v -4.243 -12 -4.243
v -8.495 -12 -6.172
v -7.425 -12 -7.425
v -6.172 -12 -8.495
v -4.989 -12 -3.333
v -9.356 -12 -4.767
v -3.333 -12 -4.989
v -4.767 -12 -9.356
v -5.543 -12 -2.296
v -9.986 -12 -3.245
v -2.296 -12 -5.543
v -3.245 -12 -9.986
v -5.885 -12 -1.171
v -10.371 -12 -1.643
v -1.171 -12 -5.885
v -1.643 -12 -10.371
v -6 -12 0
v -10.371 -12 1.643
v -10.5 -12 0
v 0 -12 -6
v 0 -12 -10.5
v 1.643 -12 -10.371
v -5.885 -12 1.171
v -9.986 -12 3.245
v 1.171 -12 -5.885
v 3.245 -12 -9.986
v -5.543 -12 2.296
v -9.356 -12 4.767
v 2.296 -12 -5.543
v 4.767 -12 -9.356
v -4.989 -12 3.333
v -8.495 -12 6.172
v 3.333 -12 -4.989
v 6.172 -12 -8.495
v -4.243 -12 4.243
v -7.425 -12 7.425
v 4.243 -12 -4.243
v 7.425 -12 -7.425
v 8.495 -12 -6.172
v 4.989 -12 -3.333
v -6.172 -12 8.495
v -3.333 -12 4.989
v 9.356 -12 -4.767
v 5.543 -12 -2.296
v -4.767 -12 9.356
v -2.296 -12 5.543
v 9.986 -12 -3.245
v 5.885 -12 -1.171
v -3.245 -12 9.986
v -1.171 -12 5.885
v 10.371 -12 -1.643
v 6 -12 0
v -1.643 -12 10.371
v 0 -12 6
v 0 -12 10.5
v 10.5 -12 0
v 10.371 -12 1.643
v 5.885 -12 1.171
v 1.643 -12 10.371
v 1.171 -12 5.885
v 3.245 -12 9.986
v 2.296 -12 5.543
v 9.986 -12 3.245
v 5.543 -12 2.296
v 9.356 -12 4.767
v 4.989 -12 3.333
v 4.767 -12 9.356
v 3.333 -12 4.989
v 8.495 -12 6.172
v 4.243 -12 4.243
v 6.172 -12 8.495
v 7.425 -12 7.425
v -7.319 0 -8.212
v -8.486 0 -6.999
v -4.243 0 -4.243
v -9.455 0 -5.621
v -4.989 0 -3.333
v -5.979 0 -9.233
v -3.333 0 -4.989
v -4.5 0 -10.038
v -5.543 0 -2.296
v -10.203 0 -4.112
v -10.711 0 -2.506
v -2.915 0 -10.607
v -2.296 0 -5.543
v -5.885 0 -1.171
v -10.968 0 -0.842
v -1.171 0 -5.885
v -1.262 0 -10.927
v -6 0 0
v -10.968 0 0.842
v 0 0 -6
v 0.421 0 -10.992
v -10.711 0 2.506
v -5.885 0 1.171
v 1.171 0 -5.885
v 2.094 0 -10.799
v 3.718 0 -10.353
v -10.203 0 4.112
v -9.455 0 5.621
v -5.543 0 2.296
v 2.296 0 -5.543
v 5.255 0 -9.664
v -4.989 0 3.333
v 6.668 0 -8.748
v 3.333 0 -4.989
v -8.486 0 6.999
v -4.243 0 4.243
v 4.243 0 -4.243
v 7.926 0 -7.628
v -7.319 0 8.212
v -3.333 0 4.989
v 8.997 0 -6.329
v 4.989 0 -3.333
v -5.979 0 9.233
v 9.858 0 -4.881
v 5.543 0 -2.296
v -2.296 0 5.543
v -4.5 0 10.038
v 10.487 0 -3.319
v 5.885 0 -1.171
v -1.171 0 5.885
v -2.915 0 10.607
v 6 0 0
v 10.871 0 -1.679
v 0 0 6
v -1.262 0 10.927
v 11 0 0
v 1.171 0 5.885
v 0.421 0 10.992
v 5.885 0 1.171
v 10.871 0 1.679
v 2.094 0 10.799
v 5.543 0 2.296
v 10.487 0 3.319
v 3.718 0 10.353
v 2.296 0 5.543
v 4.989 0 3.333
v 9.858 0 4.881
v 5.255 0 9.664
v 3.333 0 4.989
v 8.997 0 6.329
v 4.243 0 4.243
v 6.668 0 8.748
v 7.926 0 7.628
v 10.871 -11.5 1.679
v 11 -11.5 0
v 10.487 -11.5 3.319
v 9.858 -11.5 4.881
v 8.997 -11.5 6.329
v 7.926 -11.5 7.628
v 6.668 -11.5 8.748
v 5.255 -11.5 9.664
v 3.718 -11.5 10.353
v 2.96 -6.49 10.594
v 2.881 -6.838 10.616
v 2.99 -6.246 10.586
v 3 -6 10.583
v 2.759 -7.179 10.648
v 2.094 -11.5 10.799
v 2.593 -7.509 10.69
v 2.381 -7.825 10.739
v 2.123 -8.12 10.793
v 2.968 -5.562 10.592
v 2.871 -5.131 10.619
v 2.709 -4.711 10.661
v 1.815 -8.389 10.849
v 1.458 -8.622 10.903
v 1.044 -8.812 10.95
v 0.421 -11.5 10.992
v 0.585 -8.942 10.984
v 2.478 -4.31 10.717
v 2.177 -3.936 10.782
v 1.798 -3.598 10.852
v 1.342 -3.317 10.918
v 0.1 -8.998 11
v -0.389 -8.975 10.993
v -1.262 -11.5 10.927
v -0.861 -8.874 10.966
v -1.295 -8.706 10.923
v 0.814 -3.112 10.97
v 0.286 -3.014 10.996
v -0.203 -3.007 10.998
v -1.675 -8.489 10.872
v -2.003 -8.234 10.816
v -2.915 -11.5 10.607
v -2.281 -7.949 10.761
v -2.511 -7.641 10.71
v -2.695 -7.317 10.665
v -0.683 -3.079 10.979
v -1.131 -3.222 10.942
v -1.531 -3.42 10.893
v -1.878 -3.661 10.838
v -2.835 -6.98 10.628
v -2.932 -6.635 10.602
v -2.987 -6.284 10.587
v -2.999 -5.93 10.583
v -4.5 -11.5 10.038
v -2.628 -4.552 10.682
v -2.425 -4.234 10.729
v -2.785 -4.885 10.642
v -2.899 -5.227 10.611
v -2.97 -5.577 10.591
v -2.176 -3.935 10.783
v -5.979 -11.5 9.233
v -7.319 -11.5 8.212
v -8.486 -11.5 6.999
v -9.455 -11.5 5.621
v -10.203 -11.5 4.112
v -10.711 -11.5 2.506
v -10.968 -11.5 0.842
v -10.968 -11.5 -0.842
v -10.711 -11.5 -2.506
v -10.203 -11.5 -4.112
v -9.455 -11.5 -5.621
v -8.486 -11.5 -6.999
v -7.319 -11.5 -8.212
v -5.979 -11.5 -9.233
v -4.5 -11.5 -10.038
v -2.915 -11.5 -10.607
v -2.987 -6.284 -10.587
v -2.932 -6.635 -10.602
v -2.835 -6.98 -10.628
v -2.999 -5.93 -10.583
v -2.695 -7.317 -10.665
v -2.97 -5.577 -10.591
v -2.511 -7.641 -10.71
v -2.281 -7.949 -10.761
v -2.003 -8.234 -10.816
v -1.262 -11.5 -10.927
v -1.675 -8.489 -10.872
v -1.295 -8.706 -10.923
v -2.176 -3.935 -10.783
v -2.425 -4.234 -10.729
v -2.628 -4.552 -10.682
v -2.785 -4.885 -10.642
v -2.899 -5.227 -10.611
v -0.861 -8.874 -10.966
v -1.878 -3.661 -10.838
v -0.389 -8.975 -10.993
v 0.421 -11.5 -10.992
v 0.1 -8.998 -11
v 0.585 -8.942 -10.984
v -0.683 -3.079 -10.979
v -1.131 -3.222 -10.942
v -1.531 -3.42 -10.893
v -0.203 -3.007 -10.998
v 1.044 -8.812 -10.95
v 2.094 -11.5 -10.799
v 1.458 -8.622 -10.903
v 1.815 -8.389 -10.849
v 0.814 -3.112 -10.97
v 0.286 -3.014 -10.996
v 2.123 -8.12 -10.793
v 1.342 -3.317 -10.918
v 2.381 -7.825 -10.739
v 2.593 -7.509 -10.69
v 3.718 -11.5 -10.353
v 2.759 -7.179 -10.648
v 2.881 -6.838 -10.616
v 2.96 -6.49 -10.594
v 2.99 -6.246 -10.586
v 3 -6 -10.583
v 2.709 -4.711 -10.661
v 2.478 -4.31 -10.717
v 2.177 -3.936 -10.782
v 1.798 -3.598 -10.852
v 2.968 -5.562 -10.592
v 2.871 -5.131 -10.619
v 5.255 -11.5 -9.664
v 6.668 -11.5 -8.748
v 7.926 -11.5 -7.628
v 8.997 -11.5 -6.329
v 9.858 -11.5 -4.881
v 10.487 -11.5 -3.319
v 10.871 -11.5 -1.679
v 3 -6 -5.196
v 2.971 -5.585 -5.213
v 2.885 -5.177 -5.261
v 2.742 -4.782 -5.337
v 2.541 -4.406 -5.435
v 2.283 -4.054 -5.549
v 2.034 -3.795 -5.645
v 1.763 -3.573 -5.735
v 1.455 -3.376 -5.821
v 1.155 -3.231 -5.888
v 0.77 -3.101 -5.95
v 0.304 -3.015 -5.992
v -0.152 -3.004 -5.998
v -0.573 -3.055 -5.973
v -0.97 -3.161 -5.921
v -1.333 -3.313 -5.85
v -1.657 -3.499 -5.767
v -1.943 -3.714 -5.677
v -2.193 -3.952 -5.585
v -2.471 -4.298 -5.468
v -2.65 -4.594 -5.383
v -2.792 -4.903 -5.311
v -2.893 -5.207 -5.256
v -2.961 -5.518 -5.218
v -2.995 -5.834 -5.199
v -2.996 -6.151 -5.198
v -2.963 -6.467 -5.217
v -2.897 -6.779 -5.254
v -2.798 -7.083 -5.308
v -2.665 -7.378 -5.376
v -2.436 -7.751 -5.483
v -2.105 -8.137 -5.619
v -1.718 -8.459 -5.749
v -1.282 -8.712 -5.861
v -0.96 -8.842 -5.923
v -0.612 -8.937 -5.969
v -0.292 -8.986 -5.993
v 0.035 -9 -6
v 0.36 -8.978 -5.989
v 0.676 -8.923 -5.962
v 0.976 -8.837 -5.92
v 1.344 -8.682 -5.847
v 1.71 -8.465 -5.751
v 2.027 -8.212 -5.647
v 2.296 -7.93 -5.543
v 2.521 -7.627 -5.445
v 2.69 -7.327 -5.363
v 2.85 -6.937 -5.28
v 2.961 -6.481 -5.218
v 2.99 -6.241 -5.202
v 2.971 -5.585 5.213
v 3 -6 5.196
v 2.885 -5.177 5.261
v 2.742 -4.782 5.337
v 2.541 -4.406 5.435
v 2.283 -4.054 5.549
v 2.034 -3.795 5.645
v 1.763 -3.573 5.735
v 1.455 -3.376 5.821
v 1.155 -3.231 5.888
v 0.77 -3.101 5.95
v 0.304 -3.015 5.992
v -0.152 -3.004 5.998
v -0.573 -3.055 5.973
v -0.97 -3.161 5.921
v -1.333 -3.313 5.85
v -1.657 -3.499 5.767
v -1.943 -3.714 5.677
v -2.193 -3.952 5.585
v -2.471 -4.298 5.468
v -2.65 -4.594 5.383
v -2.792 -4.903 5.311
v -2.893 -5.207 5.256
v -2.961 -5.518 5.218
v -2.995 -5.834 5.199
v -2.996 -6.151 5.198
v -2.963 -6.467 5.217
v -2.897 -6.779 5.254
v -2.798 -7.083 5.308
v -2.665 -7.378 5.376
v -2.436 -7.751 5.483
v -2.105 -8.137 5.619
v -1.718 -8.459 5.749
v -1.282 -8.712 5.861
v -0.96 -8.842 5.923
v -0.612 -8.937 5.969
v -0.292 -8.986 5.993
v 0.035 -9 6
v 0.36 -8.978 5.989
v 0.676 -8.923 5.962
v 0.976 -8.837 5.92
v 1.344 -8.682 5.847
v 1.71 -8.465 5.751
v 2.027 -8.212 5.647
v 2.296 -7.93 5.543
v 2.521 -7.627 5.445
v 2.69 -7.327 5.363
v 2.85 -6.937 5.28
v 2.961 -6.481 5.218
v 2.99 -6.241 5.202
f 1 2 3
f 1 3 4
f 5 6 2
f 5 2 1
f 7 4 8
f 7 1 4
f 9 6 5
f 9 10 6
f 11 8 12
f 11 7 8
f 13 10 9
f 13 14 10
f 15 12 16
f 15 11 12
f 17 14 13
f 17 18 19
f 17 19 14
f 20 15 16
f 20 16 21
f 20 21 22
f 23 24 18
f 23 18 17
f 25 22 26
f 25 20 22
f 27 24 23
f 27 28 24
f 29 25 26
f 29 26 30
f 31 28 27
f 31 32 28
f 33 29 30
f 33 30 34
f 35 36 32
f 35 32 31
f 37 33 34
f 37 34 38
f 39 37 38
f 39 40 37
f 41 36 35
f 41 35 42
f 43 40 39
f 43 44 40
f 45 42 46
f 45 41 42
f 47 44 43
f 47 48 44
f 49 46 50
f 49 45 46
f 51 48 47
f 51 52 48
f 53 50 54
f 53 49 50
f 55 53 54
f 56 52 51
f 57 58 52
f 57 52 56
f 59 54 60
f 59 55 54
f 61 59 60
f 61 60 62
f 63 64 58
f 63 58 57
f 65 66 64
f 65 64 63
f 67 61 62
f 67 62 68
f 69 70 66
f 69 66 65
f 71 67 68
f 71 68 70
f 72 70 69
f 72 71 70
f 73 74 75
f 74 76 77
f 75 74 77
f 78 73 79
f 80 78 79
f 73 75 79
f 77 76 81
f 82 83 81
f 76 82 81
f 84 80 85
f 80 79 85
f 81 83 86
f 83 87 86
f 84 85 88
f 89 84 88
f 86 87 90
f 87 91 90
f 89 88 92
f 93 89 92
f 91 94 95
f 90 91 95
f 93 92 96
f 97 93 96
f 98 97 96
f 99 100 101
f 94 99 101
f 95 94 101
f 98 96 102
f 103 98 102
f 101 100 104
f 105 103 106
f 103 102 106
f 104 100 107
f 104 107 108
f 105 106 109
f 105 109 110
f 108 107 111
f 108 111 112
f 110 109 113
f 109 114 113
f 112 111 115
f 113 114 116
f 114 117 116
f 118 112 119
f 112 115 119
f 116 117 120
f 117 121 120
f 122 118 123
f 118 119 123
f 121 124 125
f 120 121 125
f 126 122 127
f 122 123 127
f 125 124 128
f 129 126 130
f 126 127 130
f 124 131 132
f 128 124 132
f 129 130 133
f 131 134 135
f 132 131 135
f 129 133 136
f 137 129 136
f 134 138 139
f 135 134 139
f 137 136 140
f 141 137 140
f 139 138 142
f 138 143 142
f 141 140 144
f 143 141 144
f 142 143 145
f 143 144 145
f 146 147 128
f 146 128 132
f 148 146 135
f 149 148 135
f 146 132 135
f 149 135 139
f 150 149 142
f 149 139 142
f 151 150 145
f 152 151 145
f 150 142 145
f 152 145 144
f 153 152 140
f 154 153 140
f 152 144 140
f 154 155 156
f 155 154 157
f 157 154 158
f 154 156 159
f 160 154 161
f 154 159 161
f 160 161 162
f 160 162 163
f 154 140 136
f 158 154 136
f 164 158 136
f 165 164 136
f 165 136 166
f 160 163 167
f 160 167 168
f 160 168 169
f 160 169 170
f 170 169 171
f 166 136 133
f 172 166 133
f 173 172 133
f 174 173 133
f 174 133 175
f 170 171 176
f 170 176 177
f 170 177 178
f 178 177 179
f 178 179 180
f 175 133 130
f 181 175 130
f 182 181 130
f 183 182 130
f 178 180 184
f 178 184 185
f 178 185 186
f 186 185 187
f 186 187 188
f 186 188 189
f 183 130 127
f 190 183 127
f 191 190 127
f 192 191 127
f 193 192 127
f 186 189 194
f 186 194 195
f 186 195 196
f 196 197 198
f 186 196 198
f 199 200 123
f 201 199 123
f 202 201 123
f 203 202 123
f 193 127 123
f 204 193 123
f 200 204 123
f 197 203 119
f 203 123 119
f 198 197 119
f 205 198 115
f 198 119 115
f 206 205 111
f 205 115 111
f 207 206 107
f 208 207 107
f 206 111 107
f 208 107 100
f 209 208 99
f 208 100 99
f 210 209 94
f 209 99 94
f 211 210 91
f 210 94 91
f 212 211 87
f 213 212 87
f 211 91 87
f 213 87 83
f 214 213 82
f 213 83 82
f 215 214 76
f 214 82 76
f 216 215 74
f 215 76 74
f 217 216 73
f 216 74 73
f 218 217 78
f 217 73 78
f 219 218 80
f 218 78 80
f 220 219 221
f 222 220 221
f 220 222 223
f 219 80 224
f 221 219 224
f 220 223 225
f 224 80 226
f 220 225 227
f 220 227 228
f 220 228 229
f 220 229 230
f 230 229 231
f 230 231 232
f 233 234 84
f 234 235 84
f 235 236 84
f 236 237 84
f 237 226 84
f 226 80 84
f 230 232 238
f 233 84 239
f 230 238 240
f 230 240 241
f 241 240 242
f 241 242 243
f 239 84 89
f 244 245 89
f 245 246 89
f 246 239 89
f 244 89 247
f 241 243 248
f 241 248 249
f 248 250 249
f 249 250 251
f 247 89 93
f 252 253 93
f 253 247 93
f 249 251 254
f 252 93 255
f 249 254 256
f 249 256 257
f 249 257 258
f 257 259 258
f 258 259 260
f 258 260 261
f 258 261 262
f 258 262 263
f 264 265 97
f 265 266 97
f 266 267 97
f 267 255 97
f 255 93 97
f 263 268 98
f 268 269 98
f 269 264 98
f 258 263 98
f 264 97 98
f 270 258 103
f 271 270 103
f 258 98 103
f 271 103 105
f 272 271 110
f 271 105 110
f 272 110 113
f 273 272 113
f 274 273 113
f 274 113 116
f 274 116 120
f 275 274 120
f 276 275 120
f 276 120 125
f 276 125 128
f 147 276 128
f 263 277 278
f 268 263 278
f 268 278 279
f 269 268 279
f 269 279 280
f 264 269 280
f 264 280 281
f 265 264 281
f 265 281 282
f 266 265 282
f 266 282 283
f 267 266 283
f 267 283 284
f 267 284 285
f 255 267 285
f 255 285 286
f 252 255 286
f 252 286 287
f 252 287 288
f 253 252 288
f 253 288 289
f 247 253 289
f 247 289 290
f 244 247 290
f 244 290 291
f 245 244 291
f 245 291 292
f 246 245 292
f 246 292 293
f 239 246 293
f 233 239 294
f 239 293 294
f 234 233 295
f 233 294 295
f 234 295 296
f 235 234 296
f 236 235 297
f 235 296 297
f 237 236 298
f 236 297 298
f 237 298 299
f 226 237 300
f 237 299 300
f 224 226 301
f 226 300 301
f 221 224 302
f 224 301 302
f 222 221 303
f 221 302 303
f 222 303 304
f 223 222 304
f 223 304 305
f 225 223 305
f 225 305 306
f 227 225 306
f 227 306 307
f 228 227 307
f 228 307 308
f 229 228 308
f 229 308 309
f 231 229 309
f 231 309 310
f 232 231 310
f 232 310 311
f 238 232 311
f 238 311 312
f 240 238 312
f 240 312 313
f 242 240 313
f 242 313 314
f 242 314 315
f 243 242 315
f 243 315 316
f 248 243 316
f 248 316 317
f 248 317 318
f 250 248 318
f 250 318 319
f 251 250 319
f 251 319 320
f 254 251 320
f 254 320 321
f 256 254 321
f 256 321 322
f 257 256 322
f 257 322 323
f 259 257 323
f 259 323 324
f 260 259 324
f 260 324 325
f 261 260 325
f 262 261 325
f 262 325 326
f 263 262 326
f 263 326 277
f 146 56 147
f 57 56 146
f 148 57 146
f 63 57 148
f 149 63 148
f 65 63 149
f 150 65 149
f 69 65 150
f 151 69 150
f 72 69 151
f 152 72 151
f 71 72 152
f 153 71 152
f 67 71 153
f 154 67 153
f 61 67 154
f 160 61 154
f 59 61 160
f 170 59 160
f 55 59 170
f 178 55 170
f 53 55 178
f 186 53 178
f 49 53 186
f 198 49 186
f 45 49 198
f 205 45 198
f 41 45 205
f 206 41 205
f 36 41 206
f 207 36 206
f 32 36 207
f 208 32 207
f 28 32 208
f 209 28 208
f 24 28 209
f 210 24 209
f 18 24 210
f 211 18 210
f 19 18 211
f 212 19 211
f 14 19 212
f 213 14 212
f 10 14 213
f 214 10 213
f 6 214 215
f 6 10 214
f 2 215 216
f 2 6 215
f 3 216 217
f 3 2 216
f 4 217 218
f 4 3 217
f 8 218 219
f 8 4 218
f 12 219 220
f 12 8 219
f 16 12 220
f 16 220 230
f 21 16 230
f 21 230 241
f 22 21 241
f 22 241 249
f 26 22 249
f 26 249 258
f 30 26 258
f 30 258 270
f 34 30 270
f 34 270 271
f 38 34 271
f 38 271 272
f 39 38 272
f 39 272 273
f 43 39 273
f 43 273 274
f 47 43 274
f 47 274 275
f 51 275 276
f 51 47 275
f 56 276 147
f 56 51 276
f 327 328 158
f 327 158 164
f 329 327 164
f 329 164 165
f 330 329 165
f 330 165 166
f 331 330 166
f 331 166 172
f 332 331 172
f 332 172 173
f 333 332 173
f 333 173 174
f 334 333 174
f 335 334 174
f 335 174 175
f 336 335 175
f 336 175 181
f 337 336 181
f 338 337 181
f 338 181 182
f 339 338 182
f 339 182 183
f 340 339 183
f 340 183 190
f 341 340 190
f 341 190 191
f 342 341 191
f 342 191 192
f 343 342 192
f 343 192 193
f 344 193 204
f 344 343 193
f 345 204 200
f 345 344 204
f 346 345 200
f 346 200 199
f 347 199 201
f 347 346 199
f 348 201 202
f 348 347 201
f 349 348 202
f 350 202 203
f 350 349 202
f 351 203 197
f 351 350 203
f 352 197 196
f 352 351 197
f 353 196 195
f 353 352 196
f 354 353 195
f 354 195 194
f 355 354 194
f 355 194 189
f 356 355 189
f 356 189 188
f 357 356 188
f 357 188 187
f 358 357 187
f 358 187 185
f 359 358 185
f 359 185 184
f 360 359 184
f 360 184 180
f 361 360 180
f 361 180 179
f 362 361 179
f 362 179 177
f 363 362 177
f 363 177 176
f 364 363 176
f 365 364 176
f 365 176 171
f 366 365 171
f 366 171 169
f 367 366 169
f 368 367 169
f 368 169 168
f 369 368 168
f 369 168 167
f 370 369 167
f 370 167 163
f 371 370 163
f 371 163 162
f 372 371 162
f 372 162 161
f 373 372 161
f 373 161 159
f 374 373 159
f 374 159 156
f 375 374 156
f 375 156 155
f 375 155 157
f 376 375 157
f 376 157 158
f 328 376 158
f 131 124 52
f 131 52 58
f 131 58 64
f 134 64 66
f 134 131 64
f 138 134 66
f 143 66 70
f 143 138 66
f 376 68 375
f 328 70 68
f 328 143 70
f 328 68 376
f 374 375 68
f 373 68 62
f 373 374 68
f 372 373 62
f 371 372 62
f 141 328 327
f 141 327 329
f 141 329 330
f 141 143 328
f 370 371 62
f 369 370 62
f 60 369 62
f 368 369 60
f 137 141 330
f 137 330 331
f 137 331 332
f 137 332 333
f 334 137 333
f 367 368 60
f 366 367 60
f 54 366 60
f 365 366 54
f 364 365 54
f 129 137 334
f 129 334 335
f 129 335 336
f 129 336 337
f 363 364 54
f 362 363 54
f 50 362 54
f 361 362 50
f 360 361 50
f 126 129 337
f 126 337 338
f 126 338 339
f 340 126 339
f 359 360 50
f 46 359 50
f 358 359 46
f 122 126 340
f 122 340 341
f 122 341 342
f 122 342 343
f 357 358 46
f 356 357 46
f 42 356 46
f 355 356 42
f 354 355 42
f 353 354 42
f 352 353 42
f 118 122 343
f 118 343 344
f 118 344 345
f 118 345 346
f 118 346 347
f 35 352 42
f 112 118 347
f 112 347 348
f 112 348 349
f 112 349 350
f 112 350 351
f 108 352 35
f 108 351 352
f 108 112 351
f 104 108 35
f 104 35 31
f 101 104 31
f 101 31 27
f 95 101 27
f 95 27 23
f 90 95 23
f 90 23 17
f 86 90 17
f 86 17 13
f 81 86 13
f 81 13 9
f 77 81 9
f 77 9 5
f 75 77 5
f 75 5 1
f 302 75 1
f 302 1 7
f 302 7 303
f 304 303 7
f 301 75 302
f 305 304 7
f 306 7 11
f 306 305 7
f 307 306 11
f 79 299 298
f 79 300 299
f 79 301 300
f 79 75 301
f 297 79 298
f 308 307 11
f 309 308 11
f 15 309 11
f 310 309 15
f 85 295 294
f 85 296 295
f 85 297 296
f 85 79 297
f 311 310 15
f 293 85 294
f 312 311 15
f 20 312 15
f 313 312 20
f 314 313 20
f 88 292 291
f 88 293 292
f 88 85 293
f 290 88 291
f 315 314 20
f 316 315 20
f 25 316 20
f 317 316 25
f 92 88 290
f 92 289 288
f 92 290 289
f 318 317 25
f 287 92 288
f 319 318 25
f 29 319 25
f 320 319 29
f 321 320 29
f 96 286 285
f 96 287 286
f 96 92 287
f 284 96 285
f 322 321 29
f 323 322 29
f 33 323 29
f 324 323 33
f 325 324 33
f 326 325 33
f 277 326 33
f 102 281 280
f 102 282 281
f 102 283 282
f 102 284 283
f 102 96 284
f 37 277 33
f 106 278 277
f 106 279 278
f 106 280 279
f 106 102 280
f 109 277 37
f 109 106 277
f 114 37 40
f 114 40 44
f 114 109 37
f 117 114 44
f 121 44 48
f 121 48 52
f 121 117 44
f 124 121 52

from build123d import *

# Parameters (mm, degrees)
F0_R          = 11
F0_R_2        = 6
F1_DEPTH      = 12
F2_SIZE       = 0.5
F3_R          = 3
F4_DEPTH      = 25
F4_DEPTH_BACK = 25


with BuildPart() as f1:
    # F0 (on Front) → F1 (new body)
    with BuildSketch(Plane.XZ):
        Circle(F0_R)
        Circle(F0_R_2, mode=Mode.SUBTRACT)
    extrude(amount=F1_DEPTH)

    # F2
    f2_edges = [f1.edges().sort_by_distance(p)[0] for p in [
        (-11, -12, 0),
    ]]
    chamfer(f2_edges, length=F2_SIZE)

    # F3 (on Top) → F4 (cut, two sides)
    with BuildSketch(Plane.XY) as f4_sk:
        with Locations((0, -6)):
            Circle(F3_R)
    extrude(amount=F4_DEPTH, mode=Mode.SUBTRACT)
    extrude(f4_sk.sketch, amount=-F4_DEPTH_BACK, mode=Mode.SUBTRACT)


solid = f1.part
